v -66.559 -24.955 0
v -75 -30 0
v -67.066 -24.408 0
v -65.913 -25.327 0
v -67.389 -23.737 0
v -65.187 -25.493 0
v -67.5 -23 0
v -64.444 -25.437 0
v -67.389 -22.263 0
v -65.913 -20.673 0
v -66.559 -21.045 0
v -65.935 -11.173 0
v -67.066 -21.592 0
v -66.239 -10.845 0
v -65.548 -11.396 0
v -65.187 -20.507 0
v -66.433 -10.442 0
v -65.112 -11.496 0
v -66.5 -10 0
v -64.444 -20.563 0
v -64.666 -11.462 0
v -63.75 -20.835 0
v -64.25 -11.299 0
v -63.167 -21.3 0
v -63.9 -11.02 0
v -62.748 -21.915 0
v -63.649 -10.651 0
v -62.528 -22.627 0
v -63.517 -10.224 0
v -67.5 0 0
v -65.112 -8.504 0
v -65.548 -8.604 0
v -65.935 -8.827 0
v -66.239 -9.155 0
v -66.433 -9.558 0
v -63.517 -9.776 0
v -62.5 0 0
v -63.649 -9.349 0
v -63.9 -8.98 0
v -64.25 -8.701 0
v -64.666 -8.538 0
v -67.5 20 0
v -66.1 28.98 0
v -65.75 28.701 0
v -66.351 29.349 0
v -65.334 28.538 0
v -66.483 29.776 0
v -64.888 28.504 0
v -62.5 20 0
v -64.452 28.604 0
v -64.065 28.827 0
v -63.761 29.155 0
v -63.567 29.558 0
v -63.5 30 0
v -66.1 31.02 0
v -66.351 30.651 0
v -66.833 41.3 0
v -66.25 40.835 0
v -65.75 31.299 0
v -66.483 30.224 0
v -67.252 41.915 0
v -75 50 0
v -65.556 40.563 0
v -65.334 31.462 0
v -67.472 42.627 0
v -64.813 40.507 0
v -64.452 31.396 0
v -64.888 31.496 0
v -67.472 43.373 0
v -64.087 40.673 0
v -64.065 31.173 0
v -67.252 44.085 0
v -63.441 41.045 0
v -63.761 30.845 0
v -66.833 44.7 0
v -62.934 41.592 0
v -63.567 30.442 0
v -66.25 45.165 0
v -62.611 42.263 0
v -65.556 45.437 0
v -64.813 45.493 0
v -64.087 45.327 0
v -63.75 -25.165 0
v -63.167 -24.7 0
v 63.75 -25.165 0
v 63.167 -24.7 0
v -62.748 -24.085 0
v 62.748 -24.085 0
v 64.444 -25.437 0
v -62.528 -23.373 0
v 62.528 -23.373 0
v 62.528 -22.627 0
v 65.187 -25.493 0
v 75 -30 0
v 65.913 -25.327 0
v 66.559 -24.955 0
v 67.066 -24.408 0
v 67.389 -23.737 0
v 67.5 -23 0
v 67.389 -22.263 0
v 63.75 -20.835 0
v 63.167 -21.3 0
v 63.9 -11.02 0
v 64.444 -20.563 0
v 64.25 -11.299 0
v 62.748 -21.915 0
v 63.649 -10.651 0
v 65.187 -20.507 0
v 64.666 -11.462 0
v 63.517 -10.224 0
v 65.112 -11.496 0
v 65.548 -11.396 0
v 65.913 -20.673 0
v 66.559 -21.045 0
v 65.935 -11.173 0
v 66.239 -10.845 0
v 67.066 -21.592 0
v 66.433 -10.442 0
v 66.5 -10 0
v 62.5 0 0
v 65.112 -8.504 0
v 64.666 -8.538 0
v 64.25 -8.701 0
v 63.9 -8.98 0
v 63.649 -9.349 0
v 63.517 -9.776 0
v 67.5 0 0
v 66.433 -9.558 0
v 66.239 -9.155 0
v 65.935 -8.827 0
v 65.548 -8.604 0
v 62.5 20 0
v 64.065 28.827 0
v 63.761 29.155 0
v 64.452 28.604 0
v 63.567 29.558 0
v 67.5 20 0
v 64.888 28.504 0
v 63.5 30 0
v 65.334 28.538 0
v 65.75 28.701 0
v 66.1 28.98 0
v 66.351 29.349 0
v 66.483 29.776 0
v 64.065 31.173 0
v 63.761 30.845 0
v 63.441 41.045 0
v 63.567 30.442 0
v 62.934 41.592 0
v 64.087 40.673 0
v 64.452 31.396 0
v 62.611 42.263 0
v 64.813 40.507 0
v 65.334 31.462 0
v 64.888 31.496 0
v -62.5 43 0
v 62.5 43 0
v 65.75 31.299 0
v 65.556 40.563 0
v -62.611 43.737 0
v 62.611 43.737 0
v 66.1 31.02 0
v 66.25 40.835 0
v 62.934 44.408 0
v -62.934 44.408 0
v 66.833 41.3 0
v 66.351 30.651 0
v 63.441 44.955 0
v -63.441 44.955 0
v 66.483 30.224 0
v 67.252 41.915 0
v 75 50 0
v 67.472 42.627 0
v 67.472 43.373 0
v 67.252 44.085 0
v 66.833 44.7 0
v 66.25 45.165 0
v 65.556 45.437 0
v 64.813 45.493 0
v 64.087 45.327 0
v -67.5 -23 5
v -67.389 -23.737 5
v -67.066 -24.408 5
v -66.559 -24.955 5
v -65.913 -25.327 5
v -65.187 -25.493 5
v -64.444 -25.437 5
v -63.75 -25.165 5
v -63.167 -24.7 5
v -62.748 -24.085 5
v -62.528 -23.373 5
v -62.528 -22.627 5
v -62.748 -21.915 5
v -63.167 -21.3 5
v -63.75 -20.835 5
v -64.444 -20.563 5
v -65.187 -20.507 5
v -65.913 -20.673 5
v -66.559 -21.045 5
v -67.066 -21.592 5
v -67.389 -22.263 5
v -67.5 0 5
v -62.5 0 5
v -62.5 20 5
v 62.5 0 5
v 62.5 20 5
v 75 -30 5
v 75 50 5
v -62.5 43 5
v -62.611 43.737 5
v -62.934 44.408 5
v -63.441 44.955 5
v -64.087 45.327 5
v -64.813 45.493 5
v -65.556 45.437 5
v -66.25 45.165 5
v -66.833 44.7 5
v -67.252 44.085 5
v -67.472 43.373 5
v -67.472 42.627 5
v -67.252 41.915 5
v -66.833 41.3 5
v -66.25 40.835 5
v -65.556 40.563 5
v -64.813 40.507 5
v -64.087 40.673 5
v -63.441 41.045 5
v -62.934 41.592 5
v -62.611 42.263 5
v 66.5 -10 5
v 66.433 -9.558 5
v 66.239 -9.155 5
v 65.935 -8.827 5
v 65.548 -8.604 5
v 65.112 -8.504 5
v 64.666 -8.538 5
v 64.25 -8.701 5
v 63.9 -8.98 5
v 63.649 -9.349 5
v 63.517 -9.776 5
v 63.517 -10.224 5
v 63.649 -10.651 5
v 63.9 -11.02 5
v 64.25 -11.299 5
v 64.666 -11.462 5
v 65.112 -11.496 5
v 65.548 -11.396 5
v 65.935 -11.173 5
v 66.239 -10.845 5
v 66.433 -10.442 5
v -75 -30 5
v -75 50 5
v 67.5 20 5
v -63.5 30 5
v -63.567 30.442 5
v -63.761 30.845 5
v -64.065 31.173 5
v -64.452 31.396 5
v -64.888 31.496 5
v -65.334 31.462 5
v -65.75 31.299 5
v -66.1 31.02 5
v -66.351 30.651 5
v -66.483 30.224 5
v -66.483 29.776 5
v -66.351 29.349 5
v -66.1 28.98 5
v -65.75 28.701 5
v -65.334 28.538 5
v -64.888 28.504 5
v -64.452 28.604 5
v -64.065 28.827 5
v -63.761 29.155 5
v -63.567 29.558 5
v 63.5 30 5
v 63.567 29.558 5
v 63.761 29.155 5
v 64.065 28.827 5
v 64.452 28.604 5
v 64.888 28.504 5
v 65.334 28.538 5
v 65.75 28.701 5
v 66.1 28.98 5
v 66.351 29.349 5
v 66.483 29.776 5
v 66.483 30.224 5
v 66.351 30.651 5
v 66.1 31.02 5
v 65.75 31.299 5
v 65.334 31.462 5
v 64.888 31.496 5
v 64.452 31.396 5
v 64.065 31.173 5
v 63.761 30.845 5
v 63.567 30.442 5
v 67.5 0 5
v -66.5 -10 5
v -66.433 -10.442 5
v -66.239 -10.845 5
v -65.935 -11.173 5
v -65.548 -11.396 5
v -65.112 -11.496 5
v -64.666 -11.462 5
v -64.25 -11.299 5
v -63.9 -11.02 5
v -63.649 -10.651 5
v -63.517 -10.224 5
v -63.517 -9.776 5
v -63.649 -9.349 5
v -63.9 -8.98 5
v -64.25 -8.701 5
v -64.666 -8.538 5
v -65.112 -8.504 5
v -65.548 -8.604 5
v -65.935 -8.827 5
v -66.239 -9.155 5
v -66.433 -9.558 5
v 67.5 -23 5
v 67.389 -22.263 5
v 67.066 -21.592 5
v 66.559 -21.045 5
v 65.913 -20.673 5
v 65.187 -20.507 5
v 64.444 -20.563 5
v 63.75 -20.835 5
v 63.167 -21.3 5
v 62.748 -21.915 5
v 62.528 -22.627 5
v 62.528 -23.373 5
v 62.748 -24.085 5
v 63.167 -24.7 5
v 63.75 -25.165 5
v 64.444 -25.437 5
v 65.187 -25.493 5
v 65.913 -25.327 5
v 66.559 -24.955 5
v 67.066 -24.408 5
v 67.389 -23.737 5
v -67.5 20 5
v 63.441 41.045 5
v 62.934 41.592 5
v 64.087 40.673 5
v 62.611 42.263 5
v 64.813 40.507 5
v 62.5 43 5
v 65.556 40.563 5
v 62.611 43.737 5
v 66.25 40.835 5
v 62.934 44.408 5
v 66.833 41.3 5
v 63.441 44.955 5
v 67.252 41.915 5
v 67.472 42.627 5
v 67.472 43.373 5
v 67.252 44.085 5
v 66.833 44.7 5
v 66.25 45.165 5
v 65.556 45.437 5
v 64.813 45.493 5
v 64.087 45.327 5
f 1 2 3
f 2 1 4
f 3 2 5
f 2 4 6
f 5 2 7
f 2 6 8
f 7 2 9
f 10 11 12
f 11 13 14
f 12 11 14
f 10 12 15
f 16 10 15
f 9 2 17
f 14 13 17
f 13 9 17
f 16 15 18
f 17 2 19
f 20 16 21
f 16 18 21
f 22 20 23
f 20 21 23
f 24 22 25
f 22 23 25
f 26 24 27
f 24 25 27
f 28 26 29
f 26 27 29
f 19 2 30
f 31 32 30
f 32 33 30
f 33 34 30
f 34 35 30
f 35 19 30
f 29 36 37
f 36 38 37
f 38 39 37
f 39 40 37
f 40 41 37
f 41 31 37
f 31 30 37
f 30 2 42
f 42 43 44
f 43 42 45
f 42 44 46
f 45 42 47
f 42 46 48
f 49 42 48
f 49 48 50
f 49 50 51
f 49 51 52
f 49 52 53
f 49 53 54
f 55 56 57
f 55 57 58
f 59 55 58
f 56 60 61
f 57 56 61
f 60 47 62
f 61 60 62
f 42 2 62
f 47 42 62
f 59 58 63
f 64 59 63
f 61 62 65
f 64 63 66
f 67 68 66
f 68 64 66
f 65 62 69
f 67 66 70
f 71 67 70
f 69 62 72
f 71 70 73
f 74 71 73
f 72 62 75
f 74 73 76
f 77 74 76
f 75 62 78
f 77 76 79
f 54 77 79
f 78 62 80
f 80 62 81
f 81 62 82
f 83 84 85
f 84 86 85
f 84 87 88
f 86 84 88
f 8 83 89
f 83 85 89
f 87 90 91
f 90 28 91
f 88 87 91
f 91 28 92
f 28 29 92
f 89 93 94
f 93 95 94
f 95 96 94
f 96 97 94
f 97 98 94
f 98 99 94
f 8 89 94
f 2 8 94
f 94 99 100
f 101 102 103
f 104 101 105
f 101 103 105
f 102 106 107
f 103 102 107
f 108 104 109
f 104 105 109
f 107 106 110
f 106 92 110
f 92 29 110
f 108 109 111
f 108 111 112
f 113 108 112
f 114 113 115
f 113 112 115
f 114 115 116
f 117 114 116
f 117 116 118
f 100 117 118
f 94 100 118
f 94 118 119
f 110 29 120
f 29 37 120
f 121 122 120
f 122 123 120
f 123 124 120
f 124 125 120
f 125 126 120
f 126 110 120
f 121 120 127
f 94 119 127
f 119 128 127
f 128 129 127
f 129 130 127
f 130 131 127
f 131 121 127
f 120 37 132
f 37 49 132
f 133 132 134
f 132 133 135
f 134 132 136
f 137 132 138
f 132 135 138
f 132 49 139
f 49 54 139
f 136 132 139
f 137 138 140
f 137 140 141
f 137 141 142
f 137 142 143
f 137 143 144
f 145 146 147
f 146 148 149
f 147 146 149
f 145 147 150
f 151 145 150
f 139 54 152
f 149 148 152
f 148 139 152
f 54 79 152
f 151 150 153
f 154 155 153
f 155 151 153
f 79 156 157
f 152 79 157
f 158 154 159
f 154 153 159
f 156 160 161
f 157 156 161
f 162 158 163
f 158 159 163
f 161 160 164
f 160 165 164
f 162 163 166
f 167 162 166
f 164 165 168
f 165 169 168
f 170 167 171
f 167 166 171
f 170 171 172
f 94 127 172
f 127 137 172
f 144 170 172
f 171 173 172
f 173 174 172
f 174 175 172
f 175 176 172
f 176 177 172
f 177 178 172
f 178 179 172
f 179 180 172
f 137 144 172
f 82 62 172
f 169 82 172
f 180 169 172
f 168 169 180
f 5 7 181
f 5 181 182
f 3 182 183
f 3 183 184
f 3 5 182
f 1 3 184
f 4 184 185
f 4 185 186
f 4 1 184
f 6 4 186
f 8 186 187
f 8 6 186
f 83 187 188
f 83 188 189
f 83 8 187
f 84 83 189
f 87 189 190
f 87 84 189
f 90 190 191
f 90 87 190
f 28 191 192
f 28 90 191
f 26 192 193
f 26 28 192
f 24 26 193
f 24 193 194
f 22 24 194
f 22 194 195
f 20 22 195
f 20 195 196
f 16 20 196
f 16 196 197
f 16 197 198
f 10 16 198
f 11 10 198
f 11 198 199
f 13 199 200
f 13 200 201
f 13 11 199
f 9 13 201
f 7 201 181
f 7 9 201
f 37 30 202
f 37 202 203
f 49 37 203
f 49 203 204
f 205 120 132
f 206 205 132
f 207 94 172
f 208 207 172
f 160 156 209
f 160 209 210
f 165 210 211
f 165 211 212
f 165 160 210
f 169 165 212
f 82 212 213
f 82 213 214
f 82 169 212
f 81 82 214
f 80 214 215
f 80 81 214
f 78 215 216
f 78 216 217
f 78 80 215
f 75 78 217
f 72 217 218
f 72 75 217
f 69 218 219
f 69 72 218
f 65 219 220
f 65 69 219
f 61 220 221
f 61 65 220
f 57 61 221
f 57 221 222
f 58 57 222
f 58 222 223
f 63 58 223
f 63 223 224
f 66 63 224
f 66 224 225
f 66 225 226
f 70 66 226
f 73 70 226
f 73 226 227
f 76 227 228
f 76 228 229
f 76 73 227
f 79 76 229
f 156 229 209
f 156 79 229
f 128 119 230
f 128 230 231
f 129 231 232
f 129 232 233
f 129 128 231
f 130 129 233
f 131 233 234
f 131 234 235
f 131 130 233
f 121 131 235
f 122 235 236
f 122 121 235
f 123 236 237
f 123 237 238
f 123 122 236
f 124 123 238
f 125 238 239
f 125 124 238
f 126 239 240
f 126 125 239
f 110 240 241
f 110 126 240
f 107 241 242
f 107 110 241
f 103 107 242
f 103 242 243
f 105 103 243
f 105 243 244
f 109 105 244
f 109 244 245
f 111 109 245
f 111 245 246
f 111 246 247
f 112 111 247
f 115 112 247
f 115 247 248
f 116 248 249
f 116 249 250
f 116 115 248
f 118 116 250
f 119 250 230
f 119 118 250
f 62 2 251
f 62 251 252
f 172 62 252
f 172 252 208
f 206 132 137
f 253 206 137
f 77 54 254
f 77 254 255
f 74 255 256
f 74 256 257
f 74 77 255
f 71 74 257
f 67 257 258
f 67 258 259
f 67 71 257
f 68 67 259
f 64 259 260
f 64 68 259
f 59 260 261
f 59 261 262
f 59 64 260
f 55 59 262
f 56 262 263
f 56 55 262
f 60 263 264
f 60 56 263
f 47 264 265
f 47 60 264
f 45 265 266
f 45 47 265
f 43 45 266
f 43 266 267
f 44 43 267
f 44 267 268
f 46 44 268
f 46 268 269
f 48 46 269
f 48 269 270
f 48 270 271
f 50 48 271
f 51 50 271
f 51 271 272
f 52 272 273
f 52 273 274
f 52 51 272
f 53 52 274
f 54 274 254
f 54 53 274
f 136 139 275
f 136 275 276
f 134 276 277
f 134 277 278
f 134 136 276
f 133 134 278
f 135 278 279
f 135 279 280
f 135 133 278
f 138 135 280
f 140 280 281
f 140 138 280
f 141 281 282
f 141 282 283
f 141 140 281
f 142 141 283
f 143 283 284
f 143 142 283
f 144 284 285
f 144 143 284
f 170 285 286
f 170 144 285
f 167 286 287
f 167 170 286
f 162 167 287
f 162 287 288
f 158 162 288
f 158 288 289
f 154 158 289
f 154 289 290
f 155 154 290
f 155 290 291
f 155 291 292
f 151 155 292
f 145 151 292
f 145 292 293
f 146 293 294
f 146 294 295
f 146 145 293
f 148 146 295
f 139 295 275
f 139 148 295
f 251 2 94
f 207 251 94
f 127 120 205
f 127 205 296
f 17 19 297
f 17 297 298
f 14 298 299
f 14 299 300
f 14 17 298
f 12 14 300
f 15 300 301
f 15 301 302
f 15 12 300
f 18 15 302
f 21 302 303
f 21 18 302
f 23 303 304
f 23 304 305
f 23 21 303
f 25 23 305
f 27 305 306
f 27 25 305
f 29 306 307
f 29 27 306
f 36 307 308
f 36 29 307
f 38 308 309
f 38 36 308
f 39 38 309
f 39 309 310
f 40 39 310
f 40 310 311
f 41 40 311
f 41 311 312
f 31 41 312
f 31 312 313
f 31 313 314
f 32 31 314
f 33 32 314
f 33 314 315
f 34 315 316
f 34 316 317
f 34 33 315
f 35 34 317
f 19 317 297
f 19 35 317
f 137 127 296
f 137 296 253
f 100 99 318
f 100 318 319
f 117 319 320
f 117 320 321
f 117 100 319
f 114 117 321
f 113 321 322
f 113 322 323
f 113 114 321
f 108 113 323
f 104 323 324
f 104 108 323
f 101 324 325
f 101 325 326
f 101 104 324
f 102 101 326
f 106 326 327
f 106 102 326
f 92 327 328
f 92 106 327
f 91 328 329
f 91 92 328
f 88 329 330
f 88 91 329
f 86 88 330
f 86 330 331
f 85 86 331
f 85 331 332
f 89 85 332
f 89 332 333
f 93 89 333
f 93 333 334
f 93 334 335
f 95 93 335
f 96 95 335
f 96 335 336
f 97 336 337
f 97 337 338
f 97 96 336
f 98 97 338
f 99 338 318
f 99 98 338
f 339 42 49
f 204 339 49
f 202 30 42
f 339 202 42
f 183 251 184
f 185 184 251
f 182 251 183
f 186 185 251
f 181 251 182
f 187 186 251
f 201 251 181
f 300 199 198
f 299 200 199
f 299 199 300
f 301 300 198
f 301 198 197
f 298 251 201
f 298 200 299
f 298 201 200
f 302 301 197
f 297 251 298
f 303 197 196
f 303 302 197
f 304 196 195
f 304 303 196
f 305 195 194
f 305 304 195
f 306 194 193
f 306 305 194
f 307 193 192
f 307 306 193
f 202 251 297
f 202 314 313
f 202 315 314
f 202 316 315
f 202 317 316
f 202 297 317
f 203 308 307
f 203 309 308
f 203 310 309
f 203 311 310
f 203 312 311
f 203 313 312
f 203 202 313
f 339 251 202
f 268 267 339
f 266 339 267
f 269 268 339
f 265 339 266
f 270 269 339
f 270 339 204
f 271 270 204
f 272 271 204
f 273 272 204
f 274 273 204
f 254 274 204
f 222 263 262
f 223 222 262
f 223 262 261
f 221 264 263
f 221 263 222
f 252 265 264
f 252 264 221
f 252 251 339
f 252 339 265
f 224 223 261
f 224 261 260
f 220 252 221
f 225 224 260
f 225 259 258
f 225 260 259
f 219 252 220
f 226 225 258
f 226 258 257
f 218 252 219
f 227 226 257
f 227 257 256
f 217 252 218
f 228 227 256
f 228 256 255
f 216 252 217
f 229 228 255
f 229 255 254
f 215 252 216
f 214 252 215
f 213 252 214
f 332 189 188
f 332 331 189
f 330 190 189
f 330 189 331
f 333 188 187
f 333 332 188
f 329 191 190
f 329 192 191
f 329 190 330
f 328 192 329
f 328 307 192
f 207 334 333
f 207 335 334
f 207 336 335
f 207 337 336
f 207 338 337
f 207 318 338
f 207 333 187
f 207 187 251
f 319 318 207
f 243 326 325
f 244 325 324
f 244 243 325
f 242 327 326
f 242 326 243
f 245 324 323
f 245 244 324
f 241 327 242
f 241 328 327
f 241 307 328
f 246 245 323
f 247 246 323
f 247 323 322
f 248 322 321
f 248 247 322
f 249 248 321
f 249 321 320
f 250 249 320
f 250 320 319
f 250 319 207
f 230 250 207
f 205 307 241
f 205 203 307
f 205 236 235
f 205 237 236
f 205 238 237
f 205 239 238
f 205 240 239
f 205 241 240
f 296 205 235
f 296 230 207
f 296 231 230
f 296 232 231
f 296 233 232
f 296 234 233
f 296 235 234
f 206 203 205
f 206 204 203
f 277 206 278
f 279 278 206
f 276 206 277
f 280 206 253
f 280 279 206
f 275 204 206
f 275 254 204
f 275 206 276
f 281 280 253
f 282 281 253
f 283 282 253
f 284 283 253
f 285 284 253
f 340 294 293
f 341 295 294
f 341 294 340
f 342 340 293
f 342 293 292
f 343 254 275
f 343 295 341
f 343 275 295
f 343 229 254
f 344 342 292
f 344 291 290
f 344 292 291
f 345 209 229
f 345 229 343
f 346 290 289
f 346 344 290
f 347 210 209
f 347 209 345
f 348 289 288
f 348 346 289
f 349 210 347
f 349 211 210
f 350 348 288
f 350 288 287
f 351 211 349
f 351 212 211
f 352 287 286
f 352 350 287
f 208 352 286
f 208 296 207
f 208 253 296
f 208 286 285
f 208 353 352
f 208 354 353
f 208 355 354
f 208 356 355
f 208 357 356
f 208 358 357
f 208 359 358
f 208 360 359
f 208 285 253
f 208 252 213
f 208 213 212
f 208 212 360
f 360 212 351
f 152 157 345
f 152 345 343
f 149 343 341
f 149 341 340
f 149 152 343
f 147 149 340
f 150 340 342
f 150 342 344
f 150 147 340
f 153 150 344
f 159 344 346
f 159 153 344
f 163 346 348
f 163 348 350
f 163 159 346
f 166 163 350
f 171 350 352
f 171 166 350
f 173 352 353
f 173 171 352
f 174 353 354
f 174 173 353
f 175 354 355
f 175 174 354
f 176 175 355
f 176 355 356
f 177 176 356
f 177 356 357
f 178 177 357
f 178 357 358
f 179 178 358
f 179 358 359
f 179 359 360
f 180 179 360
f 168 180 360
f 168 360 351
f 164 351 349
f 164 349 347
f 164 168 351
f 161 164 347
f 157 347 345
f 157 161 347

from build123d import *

# Parameters (mm, degrees)
SKETCH1_W           = 150
SKETCH1_H           = 80
SKETCH1_R           = 2.5
SKETCH1_R_2         = 1.5
SKETCH1_W_2         = 5
SKETCH1_H_2         = 20
BOSS_EXTRUDE1_DEPTH = 5


with BuildPart() as part:
    # Sketch1 → Boss-Extrude1 (new body)
    with BuildSketch(Plane.XY):
        with Locations((0, 10)):
            Rectangle(SKETCH1_W, SKETCH1_H)
        with Locations((-65, 43)):
            Circle(SKETCH1_R, mode=Mode.SUBTRACT)
        with Locations(Location((65, 43, 0), (0, 0, 180))):
            Circle(SKETCH1_R, mode=Mode.SUBTRACT)
        with Locations((65, -23)):
            Circle(SKETCH1_R, mode=Mode.SUBTRACT)
        with Locations(Location((-65, -23, 0), (0, 0, 180))):
            Circle(SKETCH1_R, mode=Mode.SUBTRACT)
        with Locations((-65, 30)):
            Circle(SKETCH1_R_2, mode=Mode.SUBTRACT)
        with Locations(Location((-65, -10, 0), (0, 0, 180))):
            Circle(SKETCH1_R_2, mode=Mode.SUBTRACT)
        with Locations((65, -10)):
            Circle(SKETCH1_R_2, mode=Mode.SUBTRACT)
        with Locations(Location((65, 30, 0), (0, 0, 180))):
            Circle(SKETCH1_R_2, mode=Mode.SUBTRACT)
        with Locations((-65, 10)):
            Rectangle(SKETCH1_W_2, SKETCH1_H_2, mode=Mode.SUBTRACT)
        with Locations((65, 10)):
            Rectangle(SKETCH1_W_2, SKETCH1_H_2, mode=Mode.SUBTRACT)
    extrude(amount=BOSS_EXTRUDE1_DEPTH)


solid = part.part
